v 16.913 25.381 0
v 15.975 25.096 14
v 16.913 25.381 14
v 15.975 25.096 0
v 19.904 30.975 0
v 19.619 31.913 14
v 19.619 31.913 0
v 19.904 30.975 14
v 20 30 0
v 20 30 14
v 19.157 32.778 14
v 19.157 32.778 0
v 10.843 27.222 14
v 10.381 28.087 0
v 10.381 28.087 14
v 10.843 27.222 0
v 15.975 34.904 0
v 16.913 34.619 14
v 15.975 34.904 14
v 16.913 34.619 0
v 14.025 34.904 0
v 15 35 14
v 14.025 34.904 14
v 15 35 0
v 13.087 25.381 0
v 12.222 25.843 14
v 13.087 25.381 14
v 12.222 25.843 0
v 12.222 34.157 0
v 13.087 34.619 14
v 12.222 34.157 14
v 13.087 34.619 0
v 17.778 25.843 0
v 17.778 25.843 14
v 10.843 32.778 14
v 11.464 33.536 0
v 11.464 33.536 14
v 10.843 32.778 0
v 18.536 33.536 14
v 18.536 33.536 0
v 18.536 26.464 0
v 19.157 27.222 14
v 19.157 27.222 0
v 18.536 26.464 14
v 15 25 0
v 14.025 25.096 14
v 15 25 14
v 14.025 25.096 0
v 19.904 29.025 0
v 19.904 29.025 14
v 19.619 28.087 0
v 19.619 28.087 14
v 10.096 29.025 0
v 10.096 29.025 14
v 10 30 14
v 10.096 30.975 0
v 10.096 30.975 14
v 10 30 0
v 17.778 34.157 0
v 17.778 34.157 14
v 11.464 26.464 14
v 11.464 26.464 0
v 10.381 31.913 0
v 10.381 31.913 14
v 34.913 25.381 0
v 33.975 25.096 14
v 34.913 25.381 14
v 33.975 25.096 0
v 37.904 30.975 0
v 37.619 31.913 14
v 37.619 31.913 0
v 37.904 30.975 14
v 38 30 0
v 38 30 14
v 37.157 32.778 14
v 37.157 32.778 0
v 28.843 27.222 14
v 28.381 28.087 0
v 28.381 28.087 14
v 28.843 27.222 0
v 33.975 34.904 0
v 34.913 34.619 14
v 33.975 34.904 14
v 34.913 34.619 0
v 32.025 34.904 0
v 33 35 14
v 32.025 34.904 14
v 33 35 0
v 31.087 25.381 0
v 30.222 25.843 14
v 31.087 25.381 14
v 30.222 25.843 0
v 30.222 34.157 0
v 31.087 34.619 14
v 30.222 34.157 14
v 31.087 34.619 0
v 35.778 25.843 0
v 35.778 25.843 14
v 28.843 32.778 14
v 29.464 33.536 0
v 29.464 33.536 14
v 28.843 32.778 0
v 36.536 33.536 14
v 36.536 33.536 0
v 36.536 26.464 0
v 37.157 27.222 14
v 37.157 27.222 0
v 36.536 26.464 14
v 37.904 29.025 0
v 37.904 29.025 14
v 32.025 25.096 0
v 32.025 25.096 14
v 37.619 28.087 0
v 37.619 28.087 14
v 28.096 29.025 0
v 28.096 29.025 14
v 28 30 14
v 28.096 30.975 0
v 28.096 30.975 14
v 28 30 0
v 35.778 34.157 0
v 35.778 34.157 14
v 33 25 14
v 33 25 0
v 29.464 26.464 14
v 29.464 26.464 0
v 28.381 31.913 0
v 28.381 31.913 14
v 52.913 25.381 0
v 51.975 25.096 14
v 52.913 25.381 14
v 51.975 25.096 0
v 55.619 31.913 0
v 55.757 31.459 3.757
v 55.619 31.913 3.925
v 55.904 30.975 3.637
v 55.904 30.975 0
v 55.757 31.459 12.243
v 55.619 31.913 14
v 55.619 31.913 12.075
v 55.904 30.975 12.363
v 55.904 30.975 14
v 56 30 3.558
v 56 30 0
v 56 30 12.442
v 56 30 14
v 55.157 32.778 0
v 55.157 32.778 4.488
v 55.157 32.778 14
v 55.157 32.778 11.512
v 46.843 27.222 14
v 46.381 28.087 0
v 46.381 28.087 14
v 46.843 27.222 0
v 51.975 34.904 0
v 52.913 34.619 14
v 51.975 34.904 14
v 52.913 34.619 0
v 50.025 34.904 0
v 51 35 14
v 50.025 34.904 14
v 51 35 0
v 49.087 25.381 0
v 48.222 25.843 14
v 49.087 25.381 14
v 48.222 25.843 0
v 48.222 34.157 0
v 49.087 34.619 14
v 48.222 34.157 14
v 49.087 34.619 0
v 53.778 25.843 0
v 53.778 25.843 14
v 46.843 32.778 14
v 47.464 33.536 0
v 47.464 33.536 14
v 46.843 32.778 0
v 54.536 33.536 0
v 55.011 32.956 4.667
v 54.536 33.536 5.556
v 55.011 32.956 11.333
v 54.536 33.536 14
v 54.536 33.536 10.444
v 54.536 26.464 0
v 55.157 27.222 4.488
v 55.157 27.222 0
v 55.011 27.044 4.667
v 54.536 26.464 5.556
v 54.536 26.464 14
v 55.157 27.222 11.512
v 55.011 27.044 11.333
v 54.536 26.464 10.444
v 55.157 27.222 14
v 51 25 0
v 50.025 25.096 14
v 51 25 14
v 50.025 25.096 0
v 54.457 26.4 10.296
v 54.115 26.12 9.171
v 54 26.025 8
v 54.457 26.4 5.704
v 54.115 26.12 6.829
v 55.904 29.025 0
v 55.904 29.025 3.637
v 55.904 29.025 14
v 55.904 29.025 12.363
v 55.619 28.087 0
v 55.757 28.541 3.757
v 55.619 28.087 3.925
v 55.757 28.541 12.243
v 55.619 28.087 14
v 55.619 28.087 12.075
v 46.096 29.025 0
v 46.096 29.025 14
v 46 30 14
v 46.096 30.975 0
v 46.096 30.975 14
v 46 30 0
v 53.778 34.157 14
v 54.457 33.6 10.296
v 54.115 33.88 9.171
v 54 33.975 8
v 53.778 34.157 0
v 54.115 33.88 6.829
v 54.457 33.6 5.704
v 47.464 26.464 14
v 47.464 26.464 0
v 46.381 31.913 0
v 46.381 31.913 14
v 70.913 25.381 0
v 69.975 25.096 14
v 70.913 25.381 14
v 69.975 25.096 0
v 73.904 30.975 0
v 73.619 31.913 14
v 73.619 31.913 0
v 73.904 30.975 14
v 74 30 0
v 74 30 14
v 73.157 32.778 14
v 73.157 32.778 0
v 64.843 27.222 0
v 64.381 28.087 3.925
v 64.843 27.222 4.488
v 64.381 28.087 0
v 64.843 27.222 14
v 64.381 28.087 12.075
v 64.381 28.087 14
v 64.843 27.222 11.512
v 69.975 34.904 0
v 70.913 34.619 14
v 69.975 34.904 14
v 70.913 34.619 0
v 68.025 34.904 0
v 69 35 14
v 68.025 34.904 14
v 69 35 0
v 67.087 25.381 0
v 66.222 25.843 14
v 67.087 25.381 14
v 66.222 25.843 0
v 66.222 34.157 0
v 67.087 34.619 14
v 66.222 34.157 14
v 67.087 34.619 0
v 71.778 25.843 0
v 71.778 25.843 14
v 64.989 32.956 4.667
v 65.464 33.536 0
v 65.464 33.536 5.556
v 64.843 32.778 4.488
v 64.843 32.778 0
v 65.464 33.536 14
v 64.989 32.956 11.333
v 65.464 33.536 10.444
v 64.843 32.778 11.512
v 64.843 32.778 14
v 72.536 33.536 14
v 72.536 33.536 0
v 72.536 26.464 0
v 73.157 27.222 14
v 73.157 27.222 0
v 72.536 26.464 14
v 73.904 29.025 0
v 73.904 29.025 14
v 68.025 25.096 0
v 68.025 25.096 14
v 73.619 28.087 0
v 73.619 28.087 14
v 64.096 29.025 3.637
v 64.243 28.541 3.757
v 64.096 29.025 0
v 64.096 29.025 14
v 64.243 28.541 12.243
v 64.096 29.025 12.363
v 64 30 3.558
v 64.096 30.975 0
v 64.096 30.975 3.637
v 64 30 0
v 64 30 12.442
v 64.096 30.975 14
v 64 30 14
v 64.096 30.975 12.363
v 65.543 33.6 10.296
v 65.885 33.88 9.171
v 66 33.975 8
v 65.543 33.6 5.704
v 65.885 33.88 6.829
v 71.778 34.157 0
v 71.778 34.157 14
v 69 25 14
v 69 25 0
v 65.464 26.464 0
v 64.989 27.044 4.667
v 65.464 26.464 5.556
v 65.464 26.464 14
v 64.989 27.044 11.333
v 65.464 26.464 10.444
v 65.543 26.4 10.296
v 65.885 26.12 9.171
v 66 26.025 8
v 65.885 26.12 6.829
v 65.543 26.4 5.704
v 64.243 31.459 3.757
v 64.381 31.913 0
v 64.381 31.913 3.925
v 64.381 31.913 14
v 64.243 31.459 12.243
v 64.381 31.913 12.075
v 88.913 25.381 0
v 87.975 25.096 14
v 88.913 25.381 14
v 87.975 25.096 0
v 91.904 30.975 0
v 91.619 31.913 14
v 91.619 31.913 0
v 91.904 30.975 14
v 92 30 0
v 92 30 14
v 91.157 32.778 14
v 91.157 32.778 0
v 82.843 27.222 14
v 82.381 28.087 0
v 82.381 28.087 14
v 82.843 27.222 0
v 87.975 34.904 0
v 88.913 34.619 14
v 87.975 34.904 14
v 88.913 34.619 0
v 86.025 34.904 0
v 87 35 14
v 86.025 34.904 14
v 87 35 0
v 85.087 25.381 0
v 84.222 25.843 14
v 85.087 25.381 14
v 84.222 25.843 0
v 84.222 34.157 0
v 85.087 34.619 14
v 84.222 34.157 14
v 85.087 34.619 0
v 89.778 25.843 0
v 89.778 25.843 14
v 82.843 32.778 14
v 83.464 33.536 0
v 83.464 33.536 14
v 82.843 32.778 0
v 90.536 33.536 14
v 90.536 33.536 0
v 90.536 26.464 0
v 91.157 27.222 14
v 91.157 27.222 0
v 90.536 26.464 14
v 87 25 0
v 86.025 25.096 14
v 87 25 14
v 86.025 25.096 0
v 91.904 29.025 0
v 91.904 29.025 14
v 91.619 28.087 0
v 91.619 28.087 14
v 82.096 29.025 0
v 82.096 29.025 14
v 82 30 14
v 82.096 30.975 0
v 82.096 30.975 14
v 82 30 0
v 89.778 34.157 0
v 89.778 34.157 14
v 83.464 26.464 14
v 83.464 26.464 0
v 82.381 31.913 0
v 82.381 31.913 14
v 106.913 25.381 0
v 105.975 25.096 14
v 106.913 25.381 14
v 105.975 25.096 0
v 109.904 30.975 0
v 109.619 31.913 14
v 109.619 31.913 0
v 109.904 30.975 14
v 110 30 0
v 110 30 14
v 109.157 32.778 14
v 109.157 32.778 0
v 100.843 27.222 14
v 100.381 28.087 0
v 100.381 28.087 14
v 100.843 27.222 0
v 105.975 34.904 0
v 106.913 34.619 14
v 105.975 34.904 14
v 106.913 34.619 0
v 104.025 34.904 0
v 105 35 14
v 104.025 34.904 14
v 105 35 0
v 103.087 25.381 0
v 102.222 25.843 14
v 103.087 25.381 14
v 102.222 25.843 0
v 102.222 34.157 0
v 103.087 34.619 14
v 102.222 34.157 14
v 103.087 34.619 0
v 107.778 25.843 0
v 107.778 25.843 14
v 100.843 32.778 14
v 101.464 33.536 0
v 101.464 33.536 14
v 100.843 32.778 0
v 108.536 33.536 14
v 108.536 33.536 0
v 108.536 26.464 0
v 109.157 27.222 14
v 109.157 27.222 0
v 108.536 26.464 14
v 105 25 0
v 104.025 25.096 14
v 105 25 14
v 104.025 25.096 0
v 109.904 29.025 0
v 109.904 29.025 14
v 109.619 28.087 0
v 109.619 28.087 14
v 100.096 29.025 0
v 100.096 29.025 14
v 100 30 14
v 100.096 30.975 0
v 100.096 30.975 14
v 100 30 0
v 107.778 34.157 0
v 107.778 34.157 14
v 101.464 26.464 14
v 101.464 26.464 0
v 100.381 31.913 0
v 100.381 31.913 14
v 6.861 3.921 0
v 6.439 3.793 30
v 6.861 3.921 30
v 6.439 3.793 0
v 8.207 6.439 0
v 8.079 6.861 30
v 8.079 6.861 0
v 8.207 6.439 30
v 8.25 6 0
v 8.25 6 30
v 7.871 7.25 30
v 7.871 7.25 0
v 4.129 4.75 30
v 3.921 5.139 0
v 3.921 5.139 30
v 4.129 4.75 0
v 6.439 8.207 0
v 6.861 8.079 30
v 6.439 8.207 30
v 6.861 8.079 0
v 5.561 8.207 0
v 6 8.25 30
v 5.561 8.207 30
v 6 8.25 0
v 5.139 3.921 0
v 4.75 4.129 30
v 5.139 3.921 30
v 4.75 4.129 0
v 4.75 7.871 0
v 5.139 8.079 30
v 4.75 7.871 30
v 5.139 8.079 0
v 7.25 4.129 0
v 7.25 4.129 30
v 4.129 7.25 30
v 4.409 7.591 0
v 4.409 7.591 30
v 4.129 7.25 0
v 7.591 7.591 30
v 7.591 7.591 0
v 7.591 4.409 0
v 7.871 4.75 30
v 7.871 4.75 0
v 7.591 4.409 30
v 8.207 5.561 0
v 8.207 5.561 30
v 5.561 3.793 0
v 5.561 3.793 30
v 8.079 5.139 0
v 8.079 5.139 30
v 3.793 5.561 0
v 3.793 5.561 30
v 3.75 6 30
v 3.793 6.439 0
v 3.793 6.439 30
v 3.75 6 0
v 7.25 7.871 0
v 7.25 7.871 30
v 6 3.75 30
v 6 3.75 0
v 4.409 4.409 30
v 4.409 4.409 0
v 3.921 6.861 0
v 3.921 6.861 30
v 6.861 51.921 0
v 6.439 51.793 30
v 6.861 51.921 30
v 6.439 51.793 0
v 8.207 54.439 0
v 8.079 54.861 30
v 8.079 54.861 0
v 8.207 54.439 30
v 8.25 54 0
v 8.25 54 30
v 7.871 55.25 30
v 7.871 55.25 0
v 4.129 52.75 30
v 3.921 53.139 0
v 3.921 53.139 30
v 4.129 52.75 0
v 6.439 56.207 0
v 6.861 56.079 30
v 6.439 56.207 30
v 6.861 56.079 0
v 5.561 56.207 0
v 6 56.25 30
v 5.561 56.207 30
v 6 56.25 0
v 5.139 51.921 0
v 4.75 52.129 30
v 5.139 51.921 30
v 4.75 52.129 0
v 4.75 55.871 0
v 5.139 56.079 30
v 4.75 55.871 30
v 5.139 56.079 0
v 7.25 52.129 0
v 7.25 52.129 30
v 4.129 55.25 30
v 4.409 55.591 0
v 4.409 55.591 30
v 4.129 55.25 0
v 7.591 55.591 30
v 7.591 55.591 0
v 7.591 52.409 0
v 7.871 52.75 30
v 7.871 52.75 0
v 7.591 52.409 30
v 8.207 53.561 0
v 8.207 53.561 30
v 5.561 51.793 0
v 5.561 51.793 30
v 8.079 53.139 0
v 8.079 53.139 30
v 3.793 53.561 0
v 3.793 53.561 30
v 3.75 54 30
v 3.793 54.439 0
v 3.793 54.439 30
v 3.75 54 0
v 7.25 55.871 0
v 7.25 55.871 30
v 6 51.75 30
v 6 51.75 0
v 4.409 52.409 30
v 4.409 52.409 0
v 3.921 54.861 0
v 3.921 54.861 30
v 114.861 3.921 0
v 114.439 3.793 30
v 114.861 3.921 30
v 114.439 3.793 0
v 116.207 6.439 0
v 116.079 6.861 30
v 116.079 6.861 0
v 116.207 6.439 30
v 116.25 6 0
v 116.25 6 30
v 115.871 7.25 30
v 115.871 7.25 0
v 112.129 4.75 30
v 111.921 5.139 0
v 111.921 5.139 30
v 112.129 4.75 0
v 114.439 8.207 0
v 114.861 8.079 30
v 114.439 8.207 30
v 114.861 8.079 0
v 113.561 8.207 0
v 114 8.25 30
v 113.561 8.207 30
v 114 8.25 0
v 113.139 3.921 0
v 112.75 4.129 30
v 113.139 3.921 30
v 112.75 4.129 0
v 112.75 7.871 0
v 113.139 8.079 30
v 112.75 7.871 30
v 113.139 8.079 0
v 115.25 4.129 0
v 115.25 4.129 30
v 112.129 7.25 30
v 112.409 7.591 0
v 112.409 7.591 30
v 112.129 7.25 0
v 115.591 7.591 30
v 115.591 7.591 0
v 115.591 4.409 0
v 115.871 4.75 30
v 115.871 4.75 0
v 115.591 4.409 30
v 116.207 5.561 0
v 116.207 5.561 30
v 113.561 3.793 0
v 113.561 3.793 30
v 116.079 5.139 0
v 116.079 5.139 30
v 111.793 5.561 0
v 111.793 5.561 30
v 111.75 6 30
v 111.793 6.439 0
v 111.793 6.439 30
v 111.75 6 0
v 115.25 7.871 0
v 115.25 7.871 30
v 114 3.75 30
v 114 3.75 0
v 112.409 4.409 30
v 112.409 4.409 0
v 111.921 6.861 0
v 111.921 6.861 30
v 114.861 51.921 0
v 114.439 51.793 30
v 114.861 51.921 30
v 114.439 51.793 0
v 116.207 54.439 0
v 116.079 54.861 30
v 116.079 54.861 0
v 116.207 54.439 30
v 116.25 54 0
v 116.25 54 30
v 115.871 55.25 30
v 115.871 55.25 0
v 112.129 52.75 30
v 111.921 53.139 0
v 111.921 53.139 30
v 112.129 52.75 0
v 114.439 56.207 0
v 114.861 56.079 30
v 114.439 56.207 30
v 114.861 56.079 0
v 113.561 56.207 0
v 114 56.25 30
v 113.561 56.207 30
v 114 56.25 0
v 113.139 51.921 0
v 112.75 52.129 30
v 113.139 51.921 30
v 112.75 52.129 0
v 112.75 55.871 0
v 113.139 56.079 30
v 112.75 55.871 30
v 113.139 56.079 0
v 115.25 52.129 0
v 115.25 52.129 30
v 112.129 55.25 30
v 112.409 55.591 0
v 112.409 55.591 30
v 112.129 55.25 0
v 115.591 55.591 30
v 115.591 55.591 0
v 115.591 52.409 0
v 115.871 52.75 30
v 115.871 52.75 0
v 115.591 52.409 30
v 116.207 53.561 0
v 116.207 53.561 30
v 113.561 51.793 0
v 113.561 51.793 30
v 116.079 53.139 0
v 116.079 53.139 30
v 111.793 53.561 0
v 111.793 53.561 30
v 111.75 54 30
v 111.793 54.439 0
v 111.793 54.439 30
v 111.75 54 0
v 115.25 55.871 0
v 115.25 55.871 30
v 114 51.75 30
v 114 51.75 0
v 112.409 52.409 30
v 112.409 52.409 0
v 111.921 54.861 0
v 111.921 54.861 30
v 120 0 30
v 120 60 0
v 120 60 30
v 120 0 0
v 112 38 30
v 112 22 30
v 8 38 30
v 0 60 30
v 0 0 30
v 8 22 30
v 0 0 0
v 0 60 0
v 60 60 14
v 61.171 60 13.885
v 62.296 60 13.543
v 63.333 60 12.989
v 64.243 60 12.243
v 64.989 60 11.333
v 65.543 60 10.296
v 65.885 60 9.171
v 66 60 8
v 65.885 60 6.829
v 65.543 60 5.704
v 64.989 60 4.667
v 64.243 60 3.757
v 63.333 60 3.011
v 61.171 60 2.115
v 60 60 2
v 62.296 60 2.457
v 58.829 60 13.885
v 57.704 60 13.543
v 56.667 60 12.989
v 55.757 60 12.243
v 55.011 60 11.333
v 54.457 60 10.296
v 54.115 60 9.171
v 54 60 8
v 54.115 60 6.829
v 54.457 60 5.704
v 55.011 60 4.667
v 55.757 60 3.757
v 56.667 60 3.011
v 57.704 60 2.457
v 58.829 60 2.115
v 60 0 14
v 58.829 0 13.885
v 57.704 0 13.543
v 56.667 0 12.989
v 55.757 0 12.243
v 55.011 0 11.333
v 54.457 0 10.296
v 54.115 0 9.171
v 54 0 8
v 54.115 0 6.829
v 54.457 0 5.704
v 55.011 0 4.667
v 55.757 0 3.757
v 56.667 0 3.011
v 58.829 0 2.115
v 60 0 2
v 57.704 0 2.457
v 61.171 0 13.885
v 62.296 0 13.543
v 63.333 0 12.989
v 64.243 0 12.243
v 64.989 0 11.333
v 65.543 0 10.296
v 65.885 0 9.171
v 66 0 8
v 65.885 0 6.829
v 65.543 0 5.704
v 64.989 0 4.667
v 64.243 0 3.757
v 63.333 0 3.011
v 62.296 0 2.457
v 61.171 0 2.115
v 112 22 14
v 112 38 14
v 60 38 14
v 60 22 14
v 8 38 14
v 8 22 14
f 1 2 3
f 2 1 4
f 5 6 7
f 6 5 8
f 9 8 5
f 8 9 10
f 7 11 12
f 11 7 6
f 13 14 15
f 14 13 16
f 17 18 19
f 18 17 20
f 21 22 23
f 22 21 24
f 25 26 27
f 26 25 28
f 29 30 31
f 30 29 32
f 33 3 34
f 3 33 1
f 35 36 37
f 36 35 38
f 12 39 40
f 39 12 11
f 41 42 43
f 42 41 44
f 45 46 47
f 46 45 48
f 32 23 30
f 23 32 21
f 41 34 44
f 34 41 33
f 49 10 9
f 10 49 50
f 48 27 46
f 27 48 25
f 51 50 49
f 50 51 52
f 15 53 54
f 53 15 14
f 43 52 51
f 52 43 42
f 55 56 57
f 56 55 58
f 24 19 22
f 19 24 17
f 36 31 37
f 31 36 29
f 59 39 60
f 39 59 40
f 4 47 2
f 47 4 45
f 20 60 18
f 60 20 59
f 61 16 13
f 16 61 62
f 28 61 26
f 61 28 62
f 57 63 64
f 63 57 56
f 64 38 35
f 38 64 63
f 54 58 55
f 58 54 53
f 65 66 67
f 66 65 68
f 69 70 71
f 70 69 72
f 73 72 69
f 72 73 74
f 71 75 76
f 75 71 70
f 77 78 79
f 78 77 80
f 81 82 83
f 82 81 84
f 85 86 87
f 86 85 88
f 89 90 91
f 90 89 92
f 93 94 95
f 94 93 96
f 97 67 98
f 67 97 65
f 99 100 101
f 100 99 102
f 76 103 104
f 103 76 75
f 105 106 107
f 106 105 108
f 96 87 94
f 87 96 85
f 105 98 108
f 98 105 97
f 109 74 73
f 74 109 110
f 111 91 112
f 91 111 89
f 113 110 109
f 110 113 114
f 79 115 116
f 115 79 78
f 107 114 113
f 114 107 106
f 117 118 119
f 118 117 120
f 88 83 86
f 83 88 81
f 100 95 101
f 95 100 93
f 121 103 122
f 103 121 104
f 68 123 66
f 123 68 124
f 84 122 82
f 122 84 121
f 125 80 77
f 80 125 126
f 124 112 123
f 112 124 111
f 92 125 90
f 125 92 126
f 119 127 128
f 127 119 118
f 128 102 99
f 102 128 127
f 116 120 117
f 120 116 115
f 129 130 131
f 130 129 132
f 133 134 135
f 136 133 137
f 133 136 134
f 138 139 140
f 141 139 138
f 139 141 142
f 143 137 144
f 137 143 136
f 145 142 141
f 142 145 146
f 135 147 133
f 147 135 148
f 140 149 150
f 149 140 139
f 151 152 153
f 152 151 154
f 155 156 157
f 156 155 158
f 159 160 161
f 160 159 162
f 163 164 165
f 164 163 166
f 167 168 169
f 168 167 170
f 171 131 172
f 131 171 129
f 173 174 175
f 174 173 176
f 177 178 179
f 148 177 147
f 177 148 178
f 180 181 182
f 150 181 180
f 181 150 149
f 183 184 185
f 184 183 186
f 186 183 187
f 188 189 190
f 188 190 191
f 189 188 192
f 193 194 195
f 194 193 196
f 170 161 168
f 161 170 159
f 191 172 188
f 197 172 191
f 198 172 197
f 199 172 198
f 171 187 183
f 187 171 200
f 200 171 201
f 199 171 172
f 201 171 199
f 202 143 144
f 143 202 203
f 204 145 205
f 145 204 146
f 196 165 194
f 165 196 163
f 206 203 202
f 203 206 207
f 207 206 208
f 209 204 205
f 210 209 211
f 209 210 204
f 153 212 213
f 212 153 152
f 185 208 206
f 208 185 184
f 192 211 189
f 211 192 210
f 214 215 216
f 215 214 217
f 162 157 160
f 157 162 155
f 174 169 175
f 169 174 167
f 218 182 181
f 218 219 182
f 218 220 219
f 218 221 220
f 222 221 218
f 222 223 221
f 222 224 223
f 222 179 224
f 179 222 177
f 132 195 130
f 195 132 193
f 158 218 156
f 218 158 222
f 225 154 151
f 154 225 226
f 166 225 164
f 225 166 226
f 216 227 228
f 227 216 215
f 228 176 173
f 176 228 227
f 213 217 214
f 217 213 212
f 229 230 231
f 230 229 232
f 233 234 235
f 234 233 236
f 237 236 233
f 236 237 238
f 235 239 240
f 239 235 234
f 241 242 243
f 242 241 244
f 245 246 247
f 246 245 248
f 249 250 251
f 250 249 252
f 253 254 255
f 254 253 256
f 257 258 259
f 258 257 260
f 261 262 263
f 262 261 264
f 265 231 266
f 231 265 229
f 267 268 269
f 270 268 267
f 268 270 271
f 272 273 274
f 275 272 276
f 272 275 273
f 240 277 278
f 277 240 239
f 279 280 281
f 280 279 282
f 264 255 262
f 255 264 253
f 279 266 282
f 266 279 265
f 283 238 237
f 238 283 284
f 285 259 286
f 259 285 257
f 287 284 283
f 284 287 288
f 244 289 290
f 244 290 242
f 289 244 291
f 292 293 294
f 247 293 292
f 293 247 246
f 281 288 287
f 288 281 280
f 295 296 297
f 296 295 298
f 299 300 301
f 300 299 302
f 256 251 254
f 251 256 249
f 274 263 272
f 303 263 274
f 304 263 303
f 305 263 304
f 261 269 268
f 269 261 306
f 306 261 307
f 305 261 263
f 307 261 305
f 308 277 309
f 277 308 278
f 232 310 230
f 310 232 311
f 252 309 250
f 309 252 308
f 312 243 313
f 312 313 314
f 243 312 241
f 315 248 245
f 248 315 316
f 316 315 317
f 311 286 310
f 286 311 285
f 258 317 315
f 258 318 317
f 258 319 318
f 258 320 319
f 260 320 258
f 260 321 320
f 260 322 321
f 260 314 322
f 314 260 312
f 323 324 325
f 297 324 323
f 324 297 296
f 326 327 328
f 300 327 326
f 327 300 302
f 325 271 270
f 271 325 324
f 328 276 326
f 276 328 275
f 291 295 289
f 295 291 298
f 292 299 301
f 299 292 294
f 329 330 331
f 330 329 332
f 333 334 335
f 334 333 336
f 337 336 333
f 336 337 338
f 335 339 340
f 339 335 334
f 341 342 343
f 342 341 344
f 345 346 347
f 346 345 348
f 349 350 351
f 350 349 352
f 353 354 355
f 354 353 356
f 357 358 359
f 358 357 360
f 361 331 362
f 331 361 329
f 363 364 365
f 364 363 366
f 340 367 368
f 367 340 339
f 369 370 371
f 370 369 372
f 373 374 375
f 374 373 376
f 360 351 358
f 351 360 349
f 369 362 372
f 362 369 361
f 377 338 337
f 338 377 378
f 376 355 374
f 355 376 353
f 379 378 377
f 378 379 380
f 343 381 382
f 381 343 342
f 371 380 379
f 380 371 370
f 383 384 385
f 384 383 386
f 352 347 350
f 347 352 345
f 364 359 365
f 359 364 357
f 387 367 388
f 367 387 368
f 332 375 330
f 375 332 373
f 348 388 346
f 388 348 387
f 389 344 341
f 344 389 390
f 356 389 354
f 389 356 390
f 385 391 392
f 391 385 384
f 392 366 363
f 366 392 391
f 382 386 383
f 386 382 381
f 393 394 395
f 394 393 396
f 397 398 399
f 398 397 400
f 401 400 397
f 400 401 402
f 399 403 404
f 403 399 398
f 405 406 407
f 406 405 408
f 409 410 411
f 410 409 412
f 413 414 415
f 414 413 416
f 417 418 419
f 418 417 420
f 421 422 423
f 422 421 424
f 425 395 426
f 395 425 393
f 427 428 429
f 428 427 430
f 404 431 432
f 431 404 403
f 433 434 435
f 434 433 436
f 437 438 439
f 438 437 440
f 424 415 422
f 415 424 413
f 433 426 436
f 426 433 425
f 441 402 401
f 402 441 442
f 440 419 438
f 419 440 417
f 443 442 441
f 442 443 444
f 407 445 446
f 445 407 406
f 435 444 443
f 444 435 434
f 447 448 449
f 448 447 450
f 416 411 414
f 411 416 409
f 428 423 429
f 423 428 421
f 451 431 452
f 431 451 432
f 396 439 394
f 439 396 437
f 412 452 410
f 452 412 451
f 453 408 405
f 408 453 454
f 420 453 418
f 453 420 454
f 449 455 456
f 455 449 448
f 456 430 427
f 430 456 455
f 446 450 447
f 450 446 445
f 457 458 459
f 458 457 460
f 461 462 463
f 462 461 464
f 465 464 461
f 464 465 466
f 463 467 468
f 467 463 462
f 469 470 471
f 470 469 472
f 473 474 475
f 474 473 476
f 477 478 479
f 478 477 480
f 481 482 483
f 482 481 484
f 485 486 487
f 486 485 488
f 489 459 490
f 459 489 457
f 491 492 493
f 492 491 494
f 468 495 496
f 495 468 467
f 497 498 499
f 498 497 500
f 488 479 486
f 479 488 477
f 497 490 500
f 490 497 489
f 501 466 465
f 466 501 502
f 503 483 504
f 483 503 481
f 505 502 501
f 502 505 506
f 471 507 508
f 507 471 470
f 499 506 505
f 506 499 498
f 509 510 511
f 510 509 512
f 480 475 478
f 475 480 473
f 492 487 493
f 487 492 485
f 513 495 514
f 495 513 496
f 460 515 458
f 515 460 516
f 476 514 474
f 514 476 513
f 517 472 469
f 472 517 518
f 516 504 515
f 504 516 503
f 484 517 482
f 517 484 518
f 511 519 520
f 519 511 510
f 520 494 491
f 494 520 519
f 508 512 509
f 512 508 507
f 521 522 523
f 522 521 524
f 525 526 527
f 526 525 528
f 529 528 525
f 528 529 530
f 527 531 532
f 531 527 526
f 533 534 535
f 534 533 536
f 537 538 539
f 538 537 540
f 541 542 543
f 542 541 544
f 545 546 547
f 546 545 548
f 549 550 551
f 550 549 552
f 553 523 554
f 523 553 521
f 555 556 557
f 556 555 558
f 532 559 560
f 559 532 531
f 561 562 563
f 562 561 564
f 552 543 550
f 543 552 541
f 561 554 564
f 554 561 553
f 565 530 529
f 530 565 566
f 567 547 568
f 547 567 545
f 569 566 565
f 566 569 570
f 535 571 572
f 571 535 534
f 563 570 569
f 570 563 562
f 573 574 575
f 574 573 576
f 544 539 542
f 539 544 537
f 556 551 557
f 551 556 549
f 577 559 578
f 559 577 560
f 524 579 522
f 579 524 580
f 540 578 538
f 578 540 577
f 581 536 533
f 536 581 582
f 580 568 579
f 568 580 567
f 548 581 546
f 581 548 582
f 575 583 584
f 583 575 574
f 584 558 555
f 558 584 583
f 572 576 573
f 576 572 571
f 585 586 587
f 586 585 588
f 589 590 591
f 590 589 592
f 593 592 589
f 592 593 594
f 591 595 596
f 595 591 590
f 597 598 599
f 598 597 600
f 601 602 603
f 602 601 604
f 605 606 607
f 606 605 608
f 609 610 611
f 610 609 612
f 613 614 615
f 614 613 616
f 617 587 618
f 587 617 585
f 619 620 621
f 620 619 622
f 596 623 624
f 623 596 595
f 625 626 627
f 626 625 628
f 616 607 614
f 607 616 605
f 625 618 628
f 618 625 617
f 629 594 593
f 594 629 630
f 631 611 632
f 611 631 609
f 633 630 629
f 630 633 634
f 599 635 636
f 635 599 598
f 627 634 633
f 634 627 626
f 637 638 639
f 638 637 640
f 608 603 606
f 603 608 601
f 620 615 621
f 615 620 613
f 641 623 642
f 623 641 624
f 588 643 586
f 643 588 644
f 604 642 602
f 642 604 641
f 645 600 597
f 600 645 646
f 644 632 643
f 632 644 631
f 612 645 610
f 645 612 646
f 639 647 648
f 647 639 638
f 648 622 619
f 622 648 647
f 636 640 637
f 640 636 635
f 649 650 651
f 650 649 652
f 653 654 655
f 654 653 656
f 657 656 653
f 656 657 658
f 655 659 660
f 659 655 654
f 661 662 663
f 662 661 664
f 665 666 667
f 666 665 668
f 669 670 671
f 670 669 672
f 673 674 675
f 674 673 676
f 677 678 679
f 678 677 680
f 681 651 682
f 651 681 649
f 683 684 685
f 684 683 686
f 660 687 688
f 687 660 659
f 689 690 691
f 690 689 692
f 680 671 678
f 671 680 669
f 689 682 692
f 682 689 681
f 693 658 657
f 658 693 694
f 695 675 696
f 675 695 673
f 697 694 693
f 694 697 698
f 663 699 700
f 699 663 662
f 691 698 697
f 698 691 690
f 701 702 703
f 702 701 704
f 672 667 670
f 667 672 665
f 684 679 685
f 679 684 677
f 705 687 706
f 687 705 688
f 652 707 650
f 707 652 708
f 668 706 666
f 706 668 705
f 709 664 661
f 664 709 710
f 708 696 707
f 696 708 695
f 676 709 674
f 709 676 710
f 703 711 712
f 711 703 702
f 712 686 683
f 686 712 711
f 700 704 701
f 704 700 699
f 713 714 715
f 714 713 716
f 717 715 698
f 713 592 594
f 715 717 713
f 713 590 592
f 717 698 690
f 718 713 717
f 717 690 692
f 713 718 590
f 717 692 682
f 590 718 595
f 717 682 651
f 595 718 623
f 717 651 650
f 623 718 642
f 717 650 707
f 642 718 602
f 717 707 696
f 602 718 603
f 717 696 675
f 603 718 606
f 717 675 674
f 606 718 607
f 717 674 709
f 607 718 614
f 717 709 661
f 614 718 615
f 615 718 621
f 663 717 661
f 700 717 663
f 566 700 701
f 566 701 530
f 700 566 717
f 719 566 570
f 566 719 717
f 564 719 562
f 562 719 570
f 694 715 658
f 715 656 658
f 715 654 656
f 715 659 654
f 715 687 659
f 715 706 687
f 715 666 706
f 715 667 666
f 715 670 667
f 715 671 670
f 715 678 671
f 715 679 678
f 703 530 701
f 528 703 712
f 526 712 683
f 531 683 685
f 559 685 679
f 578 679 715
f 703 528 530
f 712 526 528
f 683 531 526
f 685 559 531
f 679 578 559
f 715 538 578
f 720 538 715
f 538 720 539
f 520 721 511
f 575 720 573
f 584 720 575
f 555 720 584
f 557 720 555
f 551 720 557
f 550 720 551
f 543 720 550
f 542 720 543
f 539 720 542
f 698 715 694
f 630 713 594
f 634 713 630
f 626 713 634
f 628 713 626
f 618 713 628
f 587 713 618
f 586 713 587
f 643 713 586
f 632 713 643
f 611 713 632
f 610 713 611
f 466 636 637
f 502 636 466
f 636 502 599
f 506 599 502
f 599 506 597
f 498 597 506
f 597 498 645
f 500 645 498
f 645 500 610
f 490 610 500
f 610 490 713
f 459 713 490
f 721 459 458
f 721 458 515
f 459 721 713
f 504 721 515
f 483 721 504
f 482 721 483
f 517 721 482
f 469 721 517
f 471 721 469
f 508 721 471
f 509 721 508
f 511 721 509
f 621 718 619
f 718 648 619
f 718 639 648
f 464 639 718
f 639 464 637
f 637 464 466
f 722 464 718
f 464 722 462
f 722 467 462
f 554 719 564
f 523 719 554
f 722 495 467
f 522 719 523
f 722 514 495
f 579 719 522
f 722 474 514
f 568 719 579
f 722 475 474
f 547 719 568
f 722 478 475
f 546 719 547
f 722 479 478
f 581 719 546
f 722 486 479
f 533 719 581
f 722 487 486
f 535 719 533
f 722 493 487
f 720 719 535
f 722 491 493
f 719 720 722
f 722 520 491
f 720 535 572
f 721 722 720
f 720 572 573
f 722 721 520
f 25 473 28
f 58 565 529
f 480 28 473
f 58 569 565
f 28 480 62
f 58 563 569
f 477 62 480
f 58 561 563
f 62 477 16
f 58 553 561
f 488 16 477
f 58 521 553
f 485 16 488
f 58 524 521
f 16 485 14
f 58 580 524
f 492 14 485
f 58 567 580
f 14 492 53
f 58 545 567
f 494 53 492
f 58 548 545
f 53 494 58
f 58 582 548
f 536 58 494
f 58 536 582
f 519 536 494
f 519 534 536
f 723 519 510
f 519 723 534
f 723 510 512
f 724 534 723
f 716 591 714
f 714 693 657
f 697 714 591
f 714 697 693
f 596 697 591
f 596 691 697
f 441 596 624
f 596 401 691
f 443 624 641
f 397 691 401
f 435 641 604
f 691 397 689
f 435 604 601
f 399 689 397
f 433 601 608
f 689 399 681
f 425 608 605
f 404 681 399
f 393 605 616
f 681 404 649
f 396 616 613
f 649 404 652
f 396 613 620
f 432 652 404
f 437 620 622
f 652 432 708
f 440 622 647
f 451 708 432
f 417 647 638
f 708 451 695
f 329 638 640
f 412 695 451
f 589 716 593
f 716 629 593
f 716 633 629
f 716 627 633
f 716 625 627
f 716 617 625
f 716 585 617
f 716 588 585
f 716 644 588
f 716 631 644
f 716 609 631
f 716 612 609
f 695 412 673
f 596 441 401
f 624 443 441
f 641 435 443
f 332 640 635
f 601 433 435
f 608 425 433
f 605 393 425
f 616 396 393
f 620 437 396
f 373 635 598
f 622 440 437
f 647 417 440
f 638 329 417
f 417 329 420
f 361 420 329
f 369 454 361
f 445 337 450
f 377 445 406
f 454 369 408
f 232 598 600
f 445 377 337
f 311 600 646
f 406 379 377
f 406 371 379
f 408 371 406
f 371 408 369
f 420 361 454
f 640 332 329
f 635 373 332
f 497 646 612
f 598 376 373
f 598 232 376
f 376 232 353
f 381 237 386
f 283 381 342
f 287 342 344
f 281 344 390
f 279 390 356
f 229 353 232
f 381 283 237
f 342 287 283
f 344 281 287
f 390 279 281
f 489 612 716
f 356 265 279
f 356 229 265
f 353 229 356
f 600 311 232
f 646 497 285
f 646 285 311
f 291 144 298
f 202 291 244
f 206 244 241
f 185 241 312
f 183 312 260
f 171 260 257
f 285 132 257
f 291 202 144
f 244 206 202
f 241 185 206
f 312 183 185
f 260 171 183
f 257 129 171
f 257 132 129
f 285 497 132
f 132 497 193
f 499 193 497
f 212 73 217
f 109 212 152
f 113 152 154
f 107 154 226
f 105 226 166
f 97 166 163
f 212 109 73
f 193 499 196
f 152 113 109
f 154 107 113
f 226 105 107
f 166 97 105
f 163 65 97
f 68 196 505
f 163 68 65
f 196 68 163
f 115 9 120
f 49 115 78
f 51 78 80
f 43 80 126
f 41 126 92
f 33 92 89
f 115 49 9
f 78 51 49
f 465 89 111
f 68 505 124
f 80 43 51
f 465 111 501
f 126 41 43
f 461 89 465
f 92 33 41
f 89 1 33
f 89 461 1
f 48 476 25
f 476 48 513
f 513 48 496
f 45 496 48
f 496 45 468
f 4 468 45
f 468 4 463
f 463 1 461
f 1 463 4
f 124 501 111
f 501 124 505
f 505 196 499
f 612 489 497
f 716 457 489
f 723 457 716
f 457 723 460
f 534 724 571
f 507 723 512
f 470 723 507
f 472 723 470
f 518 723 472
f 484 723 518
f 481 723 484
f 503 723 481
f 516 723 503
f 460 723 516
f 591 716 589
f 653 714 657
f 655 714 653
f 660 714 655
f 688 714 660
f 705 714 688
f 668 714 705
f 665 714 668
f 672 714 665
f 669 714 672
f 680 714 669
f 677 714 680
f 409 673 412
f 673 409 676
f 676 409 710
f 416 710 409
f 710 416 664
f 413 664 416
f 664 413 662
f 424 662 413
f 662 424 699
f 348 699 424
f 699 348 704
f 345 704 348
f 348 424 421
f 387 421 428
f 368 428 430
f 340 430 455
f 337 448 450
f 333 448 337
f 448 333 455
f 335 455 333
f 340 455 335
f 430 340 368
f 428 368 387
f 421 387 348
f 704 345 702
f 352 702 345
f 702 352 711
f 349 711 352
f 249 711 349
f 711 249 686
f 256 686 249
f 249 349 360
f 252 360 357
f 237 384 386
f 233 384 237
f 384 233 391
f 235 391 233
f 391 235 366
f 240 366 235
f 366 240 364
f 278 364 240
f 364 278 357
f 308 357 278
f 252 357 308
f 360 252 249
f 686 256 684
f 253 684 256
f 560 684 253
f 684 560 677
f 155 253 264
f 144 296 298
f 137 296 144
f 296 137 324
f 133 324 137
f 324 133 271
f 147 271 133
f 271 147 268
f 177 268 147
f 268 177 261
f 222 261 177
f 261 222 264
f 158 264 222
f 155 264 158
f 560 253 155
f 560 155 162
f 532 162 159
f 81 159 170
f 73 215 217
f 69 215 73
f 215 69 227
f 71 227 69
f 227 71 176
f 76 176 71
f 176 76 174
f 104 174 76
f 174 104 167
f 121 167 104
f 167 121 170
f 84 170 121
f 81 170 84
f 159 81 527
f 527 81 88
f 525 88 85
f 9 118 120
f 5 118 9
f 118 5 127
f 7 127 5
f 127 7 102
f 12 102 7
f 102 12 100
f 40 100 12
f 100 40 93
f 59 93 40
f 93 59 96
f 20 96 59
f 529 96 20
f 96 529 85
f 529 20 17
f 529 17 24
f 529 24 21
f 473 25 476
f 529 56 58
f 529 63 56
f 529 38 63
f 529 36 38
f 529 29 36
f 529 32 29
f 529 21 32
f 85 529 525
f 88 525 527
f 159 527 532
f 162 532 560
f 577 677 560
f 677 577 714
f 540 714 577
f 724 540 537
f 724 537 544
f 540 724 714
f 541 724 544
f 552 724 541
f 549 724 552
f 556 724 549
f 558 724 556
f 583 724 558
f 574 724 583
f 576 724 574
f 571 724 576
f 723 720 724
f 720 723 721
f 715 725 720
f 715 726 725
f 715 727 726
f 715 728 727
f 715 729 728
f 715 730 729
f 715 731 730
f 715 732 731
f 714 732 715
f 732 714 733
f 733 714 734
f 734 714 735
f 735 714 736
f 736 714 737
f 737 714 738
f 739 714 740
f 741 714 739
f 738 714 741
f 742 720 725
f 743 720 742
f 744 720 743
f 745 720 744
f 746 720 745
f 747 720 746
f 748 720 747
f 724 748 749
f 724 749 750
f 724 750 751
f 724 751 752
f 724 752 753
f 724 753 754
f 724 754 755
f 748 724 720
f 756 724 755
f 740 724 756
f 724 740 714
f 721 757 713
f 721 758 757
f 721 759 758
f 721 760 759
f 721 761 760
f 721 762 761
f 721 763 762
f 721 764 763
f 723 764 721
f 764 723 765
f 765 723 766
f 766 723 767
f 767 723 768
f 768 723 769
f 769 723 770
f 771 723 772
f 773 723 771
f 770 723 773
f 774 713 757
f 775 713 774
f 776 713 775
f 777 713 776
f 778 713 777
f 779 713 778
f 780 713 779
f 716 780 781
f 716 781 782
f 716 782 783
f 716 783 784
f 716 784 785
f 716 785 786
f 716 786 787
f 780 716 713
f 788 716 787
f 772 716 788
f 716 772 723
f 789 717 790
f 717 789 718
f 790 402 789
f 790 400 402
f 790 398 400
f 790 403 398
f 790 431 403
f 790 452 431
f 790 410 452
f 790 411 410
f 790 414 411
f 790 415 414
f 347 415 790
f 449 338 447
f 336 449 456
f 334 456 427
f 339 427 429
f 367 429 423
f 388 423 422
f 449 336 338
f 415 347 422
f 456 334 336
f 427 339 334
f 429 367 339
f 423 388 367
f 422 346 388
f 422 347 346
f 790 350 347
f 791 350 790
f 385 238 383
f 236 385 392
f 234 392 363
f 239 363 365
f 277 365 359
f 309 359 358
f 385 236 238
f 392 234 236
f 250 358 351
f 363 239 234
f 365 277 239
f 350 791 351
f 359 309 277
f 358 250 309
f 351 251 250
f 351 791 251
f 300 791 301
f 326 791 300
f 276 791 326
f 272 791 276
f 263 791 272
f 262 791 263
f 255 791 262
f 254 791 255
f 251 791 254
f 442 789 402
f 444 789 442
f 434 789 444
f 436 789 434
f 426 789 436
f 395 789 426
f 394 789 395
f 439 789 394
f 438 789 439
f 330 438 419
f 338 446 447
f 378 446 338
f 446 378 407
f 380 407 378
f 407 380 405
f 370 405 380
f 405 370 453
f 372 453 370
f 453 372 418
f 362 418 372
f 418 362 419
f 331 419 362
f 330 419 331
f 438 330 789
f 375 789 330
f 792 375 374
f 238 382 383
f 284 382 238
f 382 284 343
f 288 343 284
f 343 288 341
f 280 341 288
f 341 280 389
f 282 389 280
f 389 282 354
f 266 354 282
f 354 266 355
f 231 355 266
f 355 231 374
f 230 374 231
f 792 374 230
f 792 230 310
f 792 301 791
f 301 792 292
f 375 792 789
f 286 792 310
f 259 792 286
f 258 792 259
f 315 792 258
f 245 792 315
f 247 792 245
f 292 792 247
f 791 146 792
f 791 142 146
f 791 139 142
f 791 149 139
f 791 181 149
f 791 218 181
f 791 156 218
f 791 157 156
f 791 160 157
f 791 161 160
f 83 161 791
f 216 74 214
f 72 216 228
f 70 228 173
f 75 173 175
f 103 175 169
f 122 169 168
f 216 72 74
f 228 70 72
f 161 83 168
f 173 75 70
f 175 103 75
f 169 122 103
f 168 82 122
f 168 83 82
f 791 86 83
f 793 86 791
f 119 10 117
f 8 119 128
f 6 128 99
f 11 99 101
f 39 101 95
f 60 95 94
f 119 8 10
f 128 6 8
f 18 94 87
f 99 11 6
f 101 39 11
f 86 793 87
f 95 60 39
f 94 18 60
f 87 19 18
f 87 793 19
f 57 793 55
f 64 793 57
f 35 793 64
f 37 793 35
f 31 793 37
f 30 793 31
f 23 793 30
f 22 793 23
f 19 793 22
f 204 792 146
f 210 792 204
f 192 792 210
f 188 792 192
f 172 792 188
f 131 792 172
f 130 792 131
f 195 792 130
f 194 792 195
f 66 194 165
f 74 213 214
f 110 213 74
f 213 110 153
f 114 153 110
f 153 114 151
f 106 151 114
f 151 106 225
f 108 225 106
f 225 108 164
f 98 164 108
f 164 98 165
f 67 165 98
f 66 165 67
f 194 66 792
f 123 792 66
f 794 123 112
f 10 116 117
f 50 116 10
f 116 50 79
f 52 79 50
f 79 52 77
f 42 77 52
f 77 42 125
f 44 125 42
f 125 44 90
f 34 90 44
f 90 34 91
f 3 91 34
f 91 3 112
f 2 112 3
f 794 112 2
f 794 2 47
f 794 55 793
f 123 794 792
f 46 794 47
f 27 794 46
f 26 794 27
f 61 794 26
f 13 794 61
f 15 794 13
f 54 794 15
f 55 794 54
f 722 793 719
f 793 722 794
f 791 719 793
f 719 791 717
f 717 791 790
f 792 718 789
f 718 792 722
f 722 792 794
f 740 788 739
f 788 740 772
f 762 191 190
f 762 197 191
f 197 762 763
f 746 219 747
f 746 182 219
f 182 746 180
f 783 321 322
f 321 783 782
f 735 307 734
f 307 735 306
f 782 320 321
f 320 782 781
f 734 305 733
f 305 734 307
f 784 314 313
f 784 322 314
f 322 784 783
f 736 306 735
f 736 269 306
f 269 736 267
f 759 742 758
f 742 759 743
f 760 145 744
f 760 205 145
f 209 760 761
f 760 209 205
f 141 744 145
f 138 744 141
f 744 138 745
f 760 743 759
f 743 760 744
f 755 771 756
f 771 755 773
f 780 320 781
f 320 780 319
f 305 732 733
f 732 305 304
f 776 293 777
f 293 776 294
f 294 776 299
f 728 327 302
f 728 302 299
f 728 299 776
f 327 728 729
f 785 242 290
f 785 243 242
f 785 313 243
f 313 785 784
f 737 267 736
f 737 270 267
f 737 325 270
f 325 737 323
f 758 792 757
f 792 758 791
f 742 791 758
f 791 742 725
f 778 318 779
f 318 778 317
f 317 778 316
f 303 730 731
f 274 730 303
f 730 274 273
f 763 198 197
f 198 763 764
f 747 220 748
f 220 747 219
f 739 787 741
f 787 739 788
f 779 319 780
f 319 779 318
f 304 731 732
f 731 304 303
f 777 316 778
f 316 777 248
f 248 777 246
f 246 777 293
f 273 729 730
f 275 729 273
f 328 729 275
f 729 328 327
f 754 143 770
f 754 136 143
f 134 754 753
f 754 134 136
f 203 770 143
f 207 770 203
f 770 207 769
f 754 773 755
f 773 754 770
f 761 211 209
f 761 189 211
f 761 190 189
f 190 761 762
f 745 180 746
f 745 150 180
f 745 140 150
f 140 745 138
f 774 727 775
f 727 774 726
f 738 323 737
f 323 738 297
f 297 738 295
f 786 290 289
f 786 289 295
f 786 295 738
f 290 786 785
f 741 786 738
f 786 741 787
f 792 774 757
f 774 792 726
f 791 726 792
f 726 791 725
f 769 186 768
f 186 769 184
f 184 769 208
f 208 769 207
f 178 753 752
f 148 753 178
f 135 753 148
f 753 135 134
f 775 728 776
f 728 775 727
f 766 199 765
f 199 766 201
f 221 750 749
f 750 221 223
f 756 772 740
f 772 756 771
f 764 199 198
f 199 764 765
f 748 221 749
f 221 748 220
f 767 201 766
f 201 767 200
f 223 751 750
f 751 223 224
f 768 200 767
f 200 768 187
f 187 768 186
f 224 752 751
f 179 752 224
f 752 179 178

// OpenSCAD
$fn = 32;

// ----------------------------------------------------------------------
// Manifold block: side_outlet manifold
// ----------------------------------------------------------------------

// --- parameters (mm) ---
block_l = 120;            // block length, X
block_w = 60;             // block width, Y
block_h = 30;             // block height, Z
port_d = 10;              // port bore diameter
port_pitch = 18;          // port pitch along X
gallery_d = 16;           // top gallery width, Y
gallery_depth = 16;       // gallery pocket depth
wall_p = 8;               // gallery end wall thickness, X
mnt_d = 4.5;              // mounting hole diameter
mnt_in = 6;               // mounting hole inset from the edges
out_d = 12;               // outlet bore diameter
out_z = 8;                // outlet axis height

n_ports = 6;  // ports in the row
port_x0 = (block_l - (n_ports - 1) * port_pitch) / 2;  // first port X

difference() {
  cube([block_l, block_w, block_h]);
  for (i = [0 : n_ports - 1])
    translate([port_x0 + i * port_pitch, block_w / 2, -1])
      cylinder(h = block_h + 2, d = port_d);
  translate([wall_p, block_w / 2 - gallery_d / 2, block_h - gallery_depth])
    cube([block_l - 2 * wall_p, gallery_d, gallery_depth + 1]);
  for (cx = [mnt_in, block_l - mnt_in])
    for (cy = [mnt_in, block_w - mnt_in])
      translate([cx, cy, -1]) cylinder(h = block_h + 2, d = mnt_d);
  translate([block_l / 2, -1, out_z]) rotate([-90, 0, 0])
    cylinder(h = block_w + 2, d = out_d);
}
